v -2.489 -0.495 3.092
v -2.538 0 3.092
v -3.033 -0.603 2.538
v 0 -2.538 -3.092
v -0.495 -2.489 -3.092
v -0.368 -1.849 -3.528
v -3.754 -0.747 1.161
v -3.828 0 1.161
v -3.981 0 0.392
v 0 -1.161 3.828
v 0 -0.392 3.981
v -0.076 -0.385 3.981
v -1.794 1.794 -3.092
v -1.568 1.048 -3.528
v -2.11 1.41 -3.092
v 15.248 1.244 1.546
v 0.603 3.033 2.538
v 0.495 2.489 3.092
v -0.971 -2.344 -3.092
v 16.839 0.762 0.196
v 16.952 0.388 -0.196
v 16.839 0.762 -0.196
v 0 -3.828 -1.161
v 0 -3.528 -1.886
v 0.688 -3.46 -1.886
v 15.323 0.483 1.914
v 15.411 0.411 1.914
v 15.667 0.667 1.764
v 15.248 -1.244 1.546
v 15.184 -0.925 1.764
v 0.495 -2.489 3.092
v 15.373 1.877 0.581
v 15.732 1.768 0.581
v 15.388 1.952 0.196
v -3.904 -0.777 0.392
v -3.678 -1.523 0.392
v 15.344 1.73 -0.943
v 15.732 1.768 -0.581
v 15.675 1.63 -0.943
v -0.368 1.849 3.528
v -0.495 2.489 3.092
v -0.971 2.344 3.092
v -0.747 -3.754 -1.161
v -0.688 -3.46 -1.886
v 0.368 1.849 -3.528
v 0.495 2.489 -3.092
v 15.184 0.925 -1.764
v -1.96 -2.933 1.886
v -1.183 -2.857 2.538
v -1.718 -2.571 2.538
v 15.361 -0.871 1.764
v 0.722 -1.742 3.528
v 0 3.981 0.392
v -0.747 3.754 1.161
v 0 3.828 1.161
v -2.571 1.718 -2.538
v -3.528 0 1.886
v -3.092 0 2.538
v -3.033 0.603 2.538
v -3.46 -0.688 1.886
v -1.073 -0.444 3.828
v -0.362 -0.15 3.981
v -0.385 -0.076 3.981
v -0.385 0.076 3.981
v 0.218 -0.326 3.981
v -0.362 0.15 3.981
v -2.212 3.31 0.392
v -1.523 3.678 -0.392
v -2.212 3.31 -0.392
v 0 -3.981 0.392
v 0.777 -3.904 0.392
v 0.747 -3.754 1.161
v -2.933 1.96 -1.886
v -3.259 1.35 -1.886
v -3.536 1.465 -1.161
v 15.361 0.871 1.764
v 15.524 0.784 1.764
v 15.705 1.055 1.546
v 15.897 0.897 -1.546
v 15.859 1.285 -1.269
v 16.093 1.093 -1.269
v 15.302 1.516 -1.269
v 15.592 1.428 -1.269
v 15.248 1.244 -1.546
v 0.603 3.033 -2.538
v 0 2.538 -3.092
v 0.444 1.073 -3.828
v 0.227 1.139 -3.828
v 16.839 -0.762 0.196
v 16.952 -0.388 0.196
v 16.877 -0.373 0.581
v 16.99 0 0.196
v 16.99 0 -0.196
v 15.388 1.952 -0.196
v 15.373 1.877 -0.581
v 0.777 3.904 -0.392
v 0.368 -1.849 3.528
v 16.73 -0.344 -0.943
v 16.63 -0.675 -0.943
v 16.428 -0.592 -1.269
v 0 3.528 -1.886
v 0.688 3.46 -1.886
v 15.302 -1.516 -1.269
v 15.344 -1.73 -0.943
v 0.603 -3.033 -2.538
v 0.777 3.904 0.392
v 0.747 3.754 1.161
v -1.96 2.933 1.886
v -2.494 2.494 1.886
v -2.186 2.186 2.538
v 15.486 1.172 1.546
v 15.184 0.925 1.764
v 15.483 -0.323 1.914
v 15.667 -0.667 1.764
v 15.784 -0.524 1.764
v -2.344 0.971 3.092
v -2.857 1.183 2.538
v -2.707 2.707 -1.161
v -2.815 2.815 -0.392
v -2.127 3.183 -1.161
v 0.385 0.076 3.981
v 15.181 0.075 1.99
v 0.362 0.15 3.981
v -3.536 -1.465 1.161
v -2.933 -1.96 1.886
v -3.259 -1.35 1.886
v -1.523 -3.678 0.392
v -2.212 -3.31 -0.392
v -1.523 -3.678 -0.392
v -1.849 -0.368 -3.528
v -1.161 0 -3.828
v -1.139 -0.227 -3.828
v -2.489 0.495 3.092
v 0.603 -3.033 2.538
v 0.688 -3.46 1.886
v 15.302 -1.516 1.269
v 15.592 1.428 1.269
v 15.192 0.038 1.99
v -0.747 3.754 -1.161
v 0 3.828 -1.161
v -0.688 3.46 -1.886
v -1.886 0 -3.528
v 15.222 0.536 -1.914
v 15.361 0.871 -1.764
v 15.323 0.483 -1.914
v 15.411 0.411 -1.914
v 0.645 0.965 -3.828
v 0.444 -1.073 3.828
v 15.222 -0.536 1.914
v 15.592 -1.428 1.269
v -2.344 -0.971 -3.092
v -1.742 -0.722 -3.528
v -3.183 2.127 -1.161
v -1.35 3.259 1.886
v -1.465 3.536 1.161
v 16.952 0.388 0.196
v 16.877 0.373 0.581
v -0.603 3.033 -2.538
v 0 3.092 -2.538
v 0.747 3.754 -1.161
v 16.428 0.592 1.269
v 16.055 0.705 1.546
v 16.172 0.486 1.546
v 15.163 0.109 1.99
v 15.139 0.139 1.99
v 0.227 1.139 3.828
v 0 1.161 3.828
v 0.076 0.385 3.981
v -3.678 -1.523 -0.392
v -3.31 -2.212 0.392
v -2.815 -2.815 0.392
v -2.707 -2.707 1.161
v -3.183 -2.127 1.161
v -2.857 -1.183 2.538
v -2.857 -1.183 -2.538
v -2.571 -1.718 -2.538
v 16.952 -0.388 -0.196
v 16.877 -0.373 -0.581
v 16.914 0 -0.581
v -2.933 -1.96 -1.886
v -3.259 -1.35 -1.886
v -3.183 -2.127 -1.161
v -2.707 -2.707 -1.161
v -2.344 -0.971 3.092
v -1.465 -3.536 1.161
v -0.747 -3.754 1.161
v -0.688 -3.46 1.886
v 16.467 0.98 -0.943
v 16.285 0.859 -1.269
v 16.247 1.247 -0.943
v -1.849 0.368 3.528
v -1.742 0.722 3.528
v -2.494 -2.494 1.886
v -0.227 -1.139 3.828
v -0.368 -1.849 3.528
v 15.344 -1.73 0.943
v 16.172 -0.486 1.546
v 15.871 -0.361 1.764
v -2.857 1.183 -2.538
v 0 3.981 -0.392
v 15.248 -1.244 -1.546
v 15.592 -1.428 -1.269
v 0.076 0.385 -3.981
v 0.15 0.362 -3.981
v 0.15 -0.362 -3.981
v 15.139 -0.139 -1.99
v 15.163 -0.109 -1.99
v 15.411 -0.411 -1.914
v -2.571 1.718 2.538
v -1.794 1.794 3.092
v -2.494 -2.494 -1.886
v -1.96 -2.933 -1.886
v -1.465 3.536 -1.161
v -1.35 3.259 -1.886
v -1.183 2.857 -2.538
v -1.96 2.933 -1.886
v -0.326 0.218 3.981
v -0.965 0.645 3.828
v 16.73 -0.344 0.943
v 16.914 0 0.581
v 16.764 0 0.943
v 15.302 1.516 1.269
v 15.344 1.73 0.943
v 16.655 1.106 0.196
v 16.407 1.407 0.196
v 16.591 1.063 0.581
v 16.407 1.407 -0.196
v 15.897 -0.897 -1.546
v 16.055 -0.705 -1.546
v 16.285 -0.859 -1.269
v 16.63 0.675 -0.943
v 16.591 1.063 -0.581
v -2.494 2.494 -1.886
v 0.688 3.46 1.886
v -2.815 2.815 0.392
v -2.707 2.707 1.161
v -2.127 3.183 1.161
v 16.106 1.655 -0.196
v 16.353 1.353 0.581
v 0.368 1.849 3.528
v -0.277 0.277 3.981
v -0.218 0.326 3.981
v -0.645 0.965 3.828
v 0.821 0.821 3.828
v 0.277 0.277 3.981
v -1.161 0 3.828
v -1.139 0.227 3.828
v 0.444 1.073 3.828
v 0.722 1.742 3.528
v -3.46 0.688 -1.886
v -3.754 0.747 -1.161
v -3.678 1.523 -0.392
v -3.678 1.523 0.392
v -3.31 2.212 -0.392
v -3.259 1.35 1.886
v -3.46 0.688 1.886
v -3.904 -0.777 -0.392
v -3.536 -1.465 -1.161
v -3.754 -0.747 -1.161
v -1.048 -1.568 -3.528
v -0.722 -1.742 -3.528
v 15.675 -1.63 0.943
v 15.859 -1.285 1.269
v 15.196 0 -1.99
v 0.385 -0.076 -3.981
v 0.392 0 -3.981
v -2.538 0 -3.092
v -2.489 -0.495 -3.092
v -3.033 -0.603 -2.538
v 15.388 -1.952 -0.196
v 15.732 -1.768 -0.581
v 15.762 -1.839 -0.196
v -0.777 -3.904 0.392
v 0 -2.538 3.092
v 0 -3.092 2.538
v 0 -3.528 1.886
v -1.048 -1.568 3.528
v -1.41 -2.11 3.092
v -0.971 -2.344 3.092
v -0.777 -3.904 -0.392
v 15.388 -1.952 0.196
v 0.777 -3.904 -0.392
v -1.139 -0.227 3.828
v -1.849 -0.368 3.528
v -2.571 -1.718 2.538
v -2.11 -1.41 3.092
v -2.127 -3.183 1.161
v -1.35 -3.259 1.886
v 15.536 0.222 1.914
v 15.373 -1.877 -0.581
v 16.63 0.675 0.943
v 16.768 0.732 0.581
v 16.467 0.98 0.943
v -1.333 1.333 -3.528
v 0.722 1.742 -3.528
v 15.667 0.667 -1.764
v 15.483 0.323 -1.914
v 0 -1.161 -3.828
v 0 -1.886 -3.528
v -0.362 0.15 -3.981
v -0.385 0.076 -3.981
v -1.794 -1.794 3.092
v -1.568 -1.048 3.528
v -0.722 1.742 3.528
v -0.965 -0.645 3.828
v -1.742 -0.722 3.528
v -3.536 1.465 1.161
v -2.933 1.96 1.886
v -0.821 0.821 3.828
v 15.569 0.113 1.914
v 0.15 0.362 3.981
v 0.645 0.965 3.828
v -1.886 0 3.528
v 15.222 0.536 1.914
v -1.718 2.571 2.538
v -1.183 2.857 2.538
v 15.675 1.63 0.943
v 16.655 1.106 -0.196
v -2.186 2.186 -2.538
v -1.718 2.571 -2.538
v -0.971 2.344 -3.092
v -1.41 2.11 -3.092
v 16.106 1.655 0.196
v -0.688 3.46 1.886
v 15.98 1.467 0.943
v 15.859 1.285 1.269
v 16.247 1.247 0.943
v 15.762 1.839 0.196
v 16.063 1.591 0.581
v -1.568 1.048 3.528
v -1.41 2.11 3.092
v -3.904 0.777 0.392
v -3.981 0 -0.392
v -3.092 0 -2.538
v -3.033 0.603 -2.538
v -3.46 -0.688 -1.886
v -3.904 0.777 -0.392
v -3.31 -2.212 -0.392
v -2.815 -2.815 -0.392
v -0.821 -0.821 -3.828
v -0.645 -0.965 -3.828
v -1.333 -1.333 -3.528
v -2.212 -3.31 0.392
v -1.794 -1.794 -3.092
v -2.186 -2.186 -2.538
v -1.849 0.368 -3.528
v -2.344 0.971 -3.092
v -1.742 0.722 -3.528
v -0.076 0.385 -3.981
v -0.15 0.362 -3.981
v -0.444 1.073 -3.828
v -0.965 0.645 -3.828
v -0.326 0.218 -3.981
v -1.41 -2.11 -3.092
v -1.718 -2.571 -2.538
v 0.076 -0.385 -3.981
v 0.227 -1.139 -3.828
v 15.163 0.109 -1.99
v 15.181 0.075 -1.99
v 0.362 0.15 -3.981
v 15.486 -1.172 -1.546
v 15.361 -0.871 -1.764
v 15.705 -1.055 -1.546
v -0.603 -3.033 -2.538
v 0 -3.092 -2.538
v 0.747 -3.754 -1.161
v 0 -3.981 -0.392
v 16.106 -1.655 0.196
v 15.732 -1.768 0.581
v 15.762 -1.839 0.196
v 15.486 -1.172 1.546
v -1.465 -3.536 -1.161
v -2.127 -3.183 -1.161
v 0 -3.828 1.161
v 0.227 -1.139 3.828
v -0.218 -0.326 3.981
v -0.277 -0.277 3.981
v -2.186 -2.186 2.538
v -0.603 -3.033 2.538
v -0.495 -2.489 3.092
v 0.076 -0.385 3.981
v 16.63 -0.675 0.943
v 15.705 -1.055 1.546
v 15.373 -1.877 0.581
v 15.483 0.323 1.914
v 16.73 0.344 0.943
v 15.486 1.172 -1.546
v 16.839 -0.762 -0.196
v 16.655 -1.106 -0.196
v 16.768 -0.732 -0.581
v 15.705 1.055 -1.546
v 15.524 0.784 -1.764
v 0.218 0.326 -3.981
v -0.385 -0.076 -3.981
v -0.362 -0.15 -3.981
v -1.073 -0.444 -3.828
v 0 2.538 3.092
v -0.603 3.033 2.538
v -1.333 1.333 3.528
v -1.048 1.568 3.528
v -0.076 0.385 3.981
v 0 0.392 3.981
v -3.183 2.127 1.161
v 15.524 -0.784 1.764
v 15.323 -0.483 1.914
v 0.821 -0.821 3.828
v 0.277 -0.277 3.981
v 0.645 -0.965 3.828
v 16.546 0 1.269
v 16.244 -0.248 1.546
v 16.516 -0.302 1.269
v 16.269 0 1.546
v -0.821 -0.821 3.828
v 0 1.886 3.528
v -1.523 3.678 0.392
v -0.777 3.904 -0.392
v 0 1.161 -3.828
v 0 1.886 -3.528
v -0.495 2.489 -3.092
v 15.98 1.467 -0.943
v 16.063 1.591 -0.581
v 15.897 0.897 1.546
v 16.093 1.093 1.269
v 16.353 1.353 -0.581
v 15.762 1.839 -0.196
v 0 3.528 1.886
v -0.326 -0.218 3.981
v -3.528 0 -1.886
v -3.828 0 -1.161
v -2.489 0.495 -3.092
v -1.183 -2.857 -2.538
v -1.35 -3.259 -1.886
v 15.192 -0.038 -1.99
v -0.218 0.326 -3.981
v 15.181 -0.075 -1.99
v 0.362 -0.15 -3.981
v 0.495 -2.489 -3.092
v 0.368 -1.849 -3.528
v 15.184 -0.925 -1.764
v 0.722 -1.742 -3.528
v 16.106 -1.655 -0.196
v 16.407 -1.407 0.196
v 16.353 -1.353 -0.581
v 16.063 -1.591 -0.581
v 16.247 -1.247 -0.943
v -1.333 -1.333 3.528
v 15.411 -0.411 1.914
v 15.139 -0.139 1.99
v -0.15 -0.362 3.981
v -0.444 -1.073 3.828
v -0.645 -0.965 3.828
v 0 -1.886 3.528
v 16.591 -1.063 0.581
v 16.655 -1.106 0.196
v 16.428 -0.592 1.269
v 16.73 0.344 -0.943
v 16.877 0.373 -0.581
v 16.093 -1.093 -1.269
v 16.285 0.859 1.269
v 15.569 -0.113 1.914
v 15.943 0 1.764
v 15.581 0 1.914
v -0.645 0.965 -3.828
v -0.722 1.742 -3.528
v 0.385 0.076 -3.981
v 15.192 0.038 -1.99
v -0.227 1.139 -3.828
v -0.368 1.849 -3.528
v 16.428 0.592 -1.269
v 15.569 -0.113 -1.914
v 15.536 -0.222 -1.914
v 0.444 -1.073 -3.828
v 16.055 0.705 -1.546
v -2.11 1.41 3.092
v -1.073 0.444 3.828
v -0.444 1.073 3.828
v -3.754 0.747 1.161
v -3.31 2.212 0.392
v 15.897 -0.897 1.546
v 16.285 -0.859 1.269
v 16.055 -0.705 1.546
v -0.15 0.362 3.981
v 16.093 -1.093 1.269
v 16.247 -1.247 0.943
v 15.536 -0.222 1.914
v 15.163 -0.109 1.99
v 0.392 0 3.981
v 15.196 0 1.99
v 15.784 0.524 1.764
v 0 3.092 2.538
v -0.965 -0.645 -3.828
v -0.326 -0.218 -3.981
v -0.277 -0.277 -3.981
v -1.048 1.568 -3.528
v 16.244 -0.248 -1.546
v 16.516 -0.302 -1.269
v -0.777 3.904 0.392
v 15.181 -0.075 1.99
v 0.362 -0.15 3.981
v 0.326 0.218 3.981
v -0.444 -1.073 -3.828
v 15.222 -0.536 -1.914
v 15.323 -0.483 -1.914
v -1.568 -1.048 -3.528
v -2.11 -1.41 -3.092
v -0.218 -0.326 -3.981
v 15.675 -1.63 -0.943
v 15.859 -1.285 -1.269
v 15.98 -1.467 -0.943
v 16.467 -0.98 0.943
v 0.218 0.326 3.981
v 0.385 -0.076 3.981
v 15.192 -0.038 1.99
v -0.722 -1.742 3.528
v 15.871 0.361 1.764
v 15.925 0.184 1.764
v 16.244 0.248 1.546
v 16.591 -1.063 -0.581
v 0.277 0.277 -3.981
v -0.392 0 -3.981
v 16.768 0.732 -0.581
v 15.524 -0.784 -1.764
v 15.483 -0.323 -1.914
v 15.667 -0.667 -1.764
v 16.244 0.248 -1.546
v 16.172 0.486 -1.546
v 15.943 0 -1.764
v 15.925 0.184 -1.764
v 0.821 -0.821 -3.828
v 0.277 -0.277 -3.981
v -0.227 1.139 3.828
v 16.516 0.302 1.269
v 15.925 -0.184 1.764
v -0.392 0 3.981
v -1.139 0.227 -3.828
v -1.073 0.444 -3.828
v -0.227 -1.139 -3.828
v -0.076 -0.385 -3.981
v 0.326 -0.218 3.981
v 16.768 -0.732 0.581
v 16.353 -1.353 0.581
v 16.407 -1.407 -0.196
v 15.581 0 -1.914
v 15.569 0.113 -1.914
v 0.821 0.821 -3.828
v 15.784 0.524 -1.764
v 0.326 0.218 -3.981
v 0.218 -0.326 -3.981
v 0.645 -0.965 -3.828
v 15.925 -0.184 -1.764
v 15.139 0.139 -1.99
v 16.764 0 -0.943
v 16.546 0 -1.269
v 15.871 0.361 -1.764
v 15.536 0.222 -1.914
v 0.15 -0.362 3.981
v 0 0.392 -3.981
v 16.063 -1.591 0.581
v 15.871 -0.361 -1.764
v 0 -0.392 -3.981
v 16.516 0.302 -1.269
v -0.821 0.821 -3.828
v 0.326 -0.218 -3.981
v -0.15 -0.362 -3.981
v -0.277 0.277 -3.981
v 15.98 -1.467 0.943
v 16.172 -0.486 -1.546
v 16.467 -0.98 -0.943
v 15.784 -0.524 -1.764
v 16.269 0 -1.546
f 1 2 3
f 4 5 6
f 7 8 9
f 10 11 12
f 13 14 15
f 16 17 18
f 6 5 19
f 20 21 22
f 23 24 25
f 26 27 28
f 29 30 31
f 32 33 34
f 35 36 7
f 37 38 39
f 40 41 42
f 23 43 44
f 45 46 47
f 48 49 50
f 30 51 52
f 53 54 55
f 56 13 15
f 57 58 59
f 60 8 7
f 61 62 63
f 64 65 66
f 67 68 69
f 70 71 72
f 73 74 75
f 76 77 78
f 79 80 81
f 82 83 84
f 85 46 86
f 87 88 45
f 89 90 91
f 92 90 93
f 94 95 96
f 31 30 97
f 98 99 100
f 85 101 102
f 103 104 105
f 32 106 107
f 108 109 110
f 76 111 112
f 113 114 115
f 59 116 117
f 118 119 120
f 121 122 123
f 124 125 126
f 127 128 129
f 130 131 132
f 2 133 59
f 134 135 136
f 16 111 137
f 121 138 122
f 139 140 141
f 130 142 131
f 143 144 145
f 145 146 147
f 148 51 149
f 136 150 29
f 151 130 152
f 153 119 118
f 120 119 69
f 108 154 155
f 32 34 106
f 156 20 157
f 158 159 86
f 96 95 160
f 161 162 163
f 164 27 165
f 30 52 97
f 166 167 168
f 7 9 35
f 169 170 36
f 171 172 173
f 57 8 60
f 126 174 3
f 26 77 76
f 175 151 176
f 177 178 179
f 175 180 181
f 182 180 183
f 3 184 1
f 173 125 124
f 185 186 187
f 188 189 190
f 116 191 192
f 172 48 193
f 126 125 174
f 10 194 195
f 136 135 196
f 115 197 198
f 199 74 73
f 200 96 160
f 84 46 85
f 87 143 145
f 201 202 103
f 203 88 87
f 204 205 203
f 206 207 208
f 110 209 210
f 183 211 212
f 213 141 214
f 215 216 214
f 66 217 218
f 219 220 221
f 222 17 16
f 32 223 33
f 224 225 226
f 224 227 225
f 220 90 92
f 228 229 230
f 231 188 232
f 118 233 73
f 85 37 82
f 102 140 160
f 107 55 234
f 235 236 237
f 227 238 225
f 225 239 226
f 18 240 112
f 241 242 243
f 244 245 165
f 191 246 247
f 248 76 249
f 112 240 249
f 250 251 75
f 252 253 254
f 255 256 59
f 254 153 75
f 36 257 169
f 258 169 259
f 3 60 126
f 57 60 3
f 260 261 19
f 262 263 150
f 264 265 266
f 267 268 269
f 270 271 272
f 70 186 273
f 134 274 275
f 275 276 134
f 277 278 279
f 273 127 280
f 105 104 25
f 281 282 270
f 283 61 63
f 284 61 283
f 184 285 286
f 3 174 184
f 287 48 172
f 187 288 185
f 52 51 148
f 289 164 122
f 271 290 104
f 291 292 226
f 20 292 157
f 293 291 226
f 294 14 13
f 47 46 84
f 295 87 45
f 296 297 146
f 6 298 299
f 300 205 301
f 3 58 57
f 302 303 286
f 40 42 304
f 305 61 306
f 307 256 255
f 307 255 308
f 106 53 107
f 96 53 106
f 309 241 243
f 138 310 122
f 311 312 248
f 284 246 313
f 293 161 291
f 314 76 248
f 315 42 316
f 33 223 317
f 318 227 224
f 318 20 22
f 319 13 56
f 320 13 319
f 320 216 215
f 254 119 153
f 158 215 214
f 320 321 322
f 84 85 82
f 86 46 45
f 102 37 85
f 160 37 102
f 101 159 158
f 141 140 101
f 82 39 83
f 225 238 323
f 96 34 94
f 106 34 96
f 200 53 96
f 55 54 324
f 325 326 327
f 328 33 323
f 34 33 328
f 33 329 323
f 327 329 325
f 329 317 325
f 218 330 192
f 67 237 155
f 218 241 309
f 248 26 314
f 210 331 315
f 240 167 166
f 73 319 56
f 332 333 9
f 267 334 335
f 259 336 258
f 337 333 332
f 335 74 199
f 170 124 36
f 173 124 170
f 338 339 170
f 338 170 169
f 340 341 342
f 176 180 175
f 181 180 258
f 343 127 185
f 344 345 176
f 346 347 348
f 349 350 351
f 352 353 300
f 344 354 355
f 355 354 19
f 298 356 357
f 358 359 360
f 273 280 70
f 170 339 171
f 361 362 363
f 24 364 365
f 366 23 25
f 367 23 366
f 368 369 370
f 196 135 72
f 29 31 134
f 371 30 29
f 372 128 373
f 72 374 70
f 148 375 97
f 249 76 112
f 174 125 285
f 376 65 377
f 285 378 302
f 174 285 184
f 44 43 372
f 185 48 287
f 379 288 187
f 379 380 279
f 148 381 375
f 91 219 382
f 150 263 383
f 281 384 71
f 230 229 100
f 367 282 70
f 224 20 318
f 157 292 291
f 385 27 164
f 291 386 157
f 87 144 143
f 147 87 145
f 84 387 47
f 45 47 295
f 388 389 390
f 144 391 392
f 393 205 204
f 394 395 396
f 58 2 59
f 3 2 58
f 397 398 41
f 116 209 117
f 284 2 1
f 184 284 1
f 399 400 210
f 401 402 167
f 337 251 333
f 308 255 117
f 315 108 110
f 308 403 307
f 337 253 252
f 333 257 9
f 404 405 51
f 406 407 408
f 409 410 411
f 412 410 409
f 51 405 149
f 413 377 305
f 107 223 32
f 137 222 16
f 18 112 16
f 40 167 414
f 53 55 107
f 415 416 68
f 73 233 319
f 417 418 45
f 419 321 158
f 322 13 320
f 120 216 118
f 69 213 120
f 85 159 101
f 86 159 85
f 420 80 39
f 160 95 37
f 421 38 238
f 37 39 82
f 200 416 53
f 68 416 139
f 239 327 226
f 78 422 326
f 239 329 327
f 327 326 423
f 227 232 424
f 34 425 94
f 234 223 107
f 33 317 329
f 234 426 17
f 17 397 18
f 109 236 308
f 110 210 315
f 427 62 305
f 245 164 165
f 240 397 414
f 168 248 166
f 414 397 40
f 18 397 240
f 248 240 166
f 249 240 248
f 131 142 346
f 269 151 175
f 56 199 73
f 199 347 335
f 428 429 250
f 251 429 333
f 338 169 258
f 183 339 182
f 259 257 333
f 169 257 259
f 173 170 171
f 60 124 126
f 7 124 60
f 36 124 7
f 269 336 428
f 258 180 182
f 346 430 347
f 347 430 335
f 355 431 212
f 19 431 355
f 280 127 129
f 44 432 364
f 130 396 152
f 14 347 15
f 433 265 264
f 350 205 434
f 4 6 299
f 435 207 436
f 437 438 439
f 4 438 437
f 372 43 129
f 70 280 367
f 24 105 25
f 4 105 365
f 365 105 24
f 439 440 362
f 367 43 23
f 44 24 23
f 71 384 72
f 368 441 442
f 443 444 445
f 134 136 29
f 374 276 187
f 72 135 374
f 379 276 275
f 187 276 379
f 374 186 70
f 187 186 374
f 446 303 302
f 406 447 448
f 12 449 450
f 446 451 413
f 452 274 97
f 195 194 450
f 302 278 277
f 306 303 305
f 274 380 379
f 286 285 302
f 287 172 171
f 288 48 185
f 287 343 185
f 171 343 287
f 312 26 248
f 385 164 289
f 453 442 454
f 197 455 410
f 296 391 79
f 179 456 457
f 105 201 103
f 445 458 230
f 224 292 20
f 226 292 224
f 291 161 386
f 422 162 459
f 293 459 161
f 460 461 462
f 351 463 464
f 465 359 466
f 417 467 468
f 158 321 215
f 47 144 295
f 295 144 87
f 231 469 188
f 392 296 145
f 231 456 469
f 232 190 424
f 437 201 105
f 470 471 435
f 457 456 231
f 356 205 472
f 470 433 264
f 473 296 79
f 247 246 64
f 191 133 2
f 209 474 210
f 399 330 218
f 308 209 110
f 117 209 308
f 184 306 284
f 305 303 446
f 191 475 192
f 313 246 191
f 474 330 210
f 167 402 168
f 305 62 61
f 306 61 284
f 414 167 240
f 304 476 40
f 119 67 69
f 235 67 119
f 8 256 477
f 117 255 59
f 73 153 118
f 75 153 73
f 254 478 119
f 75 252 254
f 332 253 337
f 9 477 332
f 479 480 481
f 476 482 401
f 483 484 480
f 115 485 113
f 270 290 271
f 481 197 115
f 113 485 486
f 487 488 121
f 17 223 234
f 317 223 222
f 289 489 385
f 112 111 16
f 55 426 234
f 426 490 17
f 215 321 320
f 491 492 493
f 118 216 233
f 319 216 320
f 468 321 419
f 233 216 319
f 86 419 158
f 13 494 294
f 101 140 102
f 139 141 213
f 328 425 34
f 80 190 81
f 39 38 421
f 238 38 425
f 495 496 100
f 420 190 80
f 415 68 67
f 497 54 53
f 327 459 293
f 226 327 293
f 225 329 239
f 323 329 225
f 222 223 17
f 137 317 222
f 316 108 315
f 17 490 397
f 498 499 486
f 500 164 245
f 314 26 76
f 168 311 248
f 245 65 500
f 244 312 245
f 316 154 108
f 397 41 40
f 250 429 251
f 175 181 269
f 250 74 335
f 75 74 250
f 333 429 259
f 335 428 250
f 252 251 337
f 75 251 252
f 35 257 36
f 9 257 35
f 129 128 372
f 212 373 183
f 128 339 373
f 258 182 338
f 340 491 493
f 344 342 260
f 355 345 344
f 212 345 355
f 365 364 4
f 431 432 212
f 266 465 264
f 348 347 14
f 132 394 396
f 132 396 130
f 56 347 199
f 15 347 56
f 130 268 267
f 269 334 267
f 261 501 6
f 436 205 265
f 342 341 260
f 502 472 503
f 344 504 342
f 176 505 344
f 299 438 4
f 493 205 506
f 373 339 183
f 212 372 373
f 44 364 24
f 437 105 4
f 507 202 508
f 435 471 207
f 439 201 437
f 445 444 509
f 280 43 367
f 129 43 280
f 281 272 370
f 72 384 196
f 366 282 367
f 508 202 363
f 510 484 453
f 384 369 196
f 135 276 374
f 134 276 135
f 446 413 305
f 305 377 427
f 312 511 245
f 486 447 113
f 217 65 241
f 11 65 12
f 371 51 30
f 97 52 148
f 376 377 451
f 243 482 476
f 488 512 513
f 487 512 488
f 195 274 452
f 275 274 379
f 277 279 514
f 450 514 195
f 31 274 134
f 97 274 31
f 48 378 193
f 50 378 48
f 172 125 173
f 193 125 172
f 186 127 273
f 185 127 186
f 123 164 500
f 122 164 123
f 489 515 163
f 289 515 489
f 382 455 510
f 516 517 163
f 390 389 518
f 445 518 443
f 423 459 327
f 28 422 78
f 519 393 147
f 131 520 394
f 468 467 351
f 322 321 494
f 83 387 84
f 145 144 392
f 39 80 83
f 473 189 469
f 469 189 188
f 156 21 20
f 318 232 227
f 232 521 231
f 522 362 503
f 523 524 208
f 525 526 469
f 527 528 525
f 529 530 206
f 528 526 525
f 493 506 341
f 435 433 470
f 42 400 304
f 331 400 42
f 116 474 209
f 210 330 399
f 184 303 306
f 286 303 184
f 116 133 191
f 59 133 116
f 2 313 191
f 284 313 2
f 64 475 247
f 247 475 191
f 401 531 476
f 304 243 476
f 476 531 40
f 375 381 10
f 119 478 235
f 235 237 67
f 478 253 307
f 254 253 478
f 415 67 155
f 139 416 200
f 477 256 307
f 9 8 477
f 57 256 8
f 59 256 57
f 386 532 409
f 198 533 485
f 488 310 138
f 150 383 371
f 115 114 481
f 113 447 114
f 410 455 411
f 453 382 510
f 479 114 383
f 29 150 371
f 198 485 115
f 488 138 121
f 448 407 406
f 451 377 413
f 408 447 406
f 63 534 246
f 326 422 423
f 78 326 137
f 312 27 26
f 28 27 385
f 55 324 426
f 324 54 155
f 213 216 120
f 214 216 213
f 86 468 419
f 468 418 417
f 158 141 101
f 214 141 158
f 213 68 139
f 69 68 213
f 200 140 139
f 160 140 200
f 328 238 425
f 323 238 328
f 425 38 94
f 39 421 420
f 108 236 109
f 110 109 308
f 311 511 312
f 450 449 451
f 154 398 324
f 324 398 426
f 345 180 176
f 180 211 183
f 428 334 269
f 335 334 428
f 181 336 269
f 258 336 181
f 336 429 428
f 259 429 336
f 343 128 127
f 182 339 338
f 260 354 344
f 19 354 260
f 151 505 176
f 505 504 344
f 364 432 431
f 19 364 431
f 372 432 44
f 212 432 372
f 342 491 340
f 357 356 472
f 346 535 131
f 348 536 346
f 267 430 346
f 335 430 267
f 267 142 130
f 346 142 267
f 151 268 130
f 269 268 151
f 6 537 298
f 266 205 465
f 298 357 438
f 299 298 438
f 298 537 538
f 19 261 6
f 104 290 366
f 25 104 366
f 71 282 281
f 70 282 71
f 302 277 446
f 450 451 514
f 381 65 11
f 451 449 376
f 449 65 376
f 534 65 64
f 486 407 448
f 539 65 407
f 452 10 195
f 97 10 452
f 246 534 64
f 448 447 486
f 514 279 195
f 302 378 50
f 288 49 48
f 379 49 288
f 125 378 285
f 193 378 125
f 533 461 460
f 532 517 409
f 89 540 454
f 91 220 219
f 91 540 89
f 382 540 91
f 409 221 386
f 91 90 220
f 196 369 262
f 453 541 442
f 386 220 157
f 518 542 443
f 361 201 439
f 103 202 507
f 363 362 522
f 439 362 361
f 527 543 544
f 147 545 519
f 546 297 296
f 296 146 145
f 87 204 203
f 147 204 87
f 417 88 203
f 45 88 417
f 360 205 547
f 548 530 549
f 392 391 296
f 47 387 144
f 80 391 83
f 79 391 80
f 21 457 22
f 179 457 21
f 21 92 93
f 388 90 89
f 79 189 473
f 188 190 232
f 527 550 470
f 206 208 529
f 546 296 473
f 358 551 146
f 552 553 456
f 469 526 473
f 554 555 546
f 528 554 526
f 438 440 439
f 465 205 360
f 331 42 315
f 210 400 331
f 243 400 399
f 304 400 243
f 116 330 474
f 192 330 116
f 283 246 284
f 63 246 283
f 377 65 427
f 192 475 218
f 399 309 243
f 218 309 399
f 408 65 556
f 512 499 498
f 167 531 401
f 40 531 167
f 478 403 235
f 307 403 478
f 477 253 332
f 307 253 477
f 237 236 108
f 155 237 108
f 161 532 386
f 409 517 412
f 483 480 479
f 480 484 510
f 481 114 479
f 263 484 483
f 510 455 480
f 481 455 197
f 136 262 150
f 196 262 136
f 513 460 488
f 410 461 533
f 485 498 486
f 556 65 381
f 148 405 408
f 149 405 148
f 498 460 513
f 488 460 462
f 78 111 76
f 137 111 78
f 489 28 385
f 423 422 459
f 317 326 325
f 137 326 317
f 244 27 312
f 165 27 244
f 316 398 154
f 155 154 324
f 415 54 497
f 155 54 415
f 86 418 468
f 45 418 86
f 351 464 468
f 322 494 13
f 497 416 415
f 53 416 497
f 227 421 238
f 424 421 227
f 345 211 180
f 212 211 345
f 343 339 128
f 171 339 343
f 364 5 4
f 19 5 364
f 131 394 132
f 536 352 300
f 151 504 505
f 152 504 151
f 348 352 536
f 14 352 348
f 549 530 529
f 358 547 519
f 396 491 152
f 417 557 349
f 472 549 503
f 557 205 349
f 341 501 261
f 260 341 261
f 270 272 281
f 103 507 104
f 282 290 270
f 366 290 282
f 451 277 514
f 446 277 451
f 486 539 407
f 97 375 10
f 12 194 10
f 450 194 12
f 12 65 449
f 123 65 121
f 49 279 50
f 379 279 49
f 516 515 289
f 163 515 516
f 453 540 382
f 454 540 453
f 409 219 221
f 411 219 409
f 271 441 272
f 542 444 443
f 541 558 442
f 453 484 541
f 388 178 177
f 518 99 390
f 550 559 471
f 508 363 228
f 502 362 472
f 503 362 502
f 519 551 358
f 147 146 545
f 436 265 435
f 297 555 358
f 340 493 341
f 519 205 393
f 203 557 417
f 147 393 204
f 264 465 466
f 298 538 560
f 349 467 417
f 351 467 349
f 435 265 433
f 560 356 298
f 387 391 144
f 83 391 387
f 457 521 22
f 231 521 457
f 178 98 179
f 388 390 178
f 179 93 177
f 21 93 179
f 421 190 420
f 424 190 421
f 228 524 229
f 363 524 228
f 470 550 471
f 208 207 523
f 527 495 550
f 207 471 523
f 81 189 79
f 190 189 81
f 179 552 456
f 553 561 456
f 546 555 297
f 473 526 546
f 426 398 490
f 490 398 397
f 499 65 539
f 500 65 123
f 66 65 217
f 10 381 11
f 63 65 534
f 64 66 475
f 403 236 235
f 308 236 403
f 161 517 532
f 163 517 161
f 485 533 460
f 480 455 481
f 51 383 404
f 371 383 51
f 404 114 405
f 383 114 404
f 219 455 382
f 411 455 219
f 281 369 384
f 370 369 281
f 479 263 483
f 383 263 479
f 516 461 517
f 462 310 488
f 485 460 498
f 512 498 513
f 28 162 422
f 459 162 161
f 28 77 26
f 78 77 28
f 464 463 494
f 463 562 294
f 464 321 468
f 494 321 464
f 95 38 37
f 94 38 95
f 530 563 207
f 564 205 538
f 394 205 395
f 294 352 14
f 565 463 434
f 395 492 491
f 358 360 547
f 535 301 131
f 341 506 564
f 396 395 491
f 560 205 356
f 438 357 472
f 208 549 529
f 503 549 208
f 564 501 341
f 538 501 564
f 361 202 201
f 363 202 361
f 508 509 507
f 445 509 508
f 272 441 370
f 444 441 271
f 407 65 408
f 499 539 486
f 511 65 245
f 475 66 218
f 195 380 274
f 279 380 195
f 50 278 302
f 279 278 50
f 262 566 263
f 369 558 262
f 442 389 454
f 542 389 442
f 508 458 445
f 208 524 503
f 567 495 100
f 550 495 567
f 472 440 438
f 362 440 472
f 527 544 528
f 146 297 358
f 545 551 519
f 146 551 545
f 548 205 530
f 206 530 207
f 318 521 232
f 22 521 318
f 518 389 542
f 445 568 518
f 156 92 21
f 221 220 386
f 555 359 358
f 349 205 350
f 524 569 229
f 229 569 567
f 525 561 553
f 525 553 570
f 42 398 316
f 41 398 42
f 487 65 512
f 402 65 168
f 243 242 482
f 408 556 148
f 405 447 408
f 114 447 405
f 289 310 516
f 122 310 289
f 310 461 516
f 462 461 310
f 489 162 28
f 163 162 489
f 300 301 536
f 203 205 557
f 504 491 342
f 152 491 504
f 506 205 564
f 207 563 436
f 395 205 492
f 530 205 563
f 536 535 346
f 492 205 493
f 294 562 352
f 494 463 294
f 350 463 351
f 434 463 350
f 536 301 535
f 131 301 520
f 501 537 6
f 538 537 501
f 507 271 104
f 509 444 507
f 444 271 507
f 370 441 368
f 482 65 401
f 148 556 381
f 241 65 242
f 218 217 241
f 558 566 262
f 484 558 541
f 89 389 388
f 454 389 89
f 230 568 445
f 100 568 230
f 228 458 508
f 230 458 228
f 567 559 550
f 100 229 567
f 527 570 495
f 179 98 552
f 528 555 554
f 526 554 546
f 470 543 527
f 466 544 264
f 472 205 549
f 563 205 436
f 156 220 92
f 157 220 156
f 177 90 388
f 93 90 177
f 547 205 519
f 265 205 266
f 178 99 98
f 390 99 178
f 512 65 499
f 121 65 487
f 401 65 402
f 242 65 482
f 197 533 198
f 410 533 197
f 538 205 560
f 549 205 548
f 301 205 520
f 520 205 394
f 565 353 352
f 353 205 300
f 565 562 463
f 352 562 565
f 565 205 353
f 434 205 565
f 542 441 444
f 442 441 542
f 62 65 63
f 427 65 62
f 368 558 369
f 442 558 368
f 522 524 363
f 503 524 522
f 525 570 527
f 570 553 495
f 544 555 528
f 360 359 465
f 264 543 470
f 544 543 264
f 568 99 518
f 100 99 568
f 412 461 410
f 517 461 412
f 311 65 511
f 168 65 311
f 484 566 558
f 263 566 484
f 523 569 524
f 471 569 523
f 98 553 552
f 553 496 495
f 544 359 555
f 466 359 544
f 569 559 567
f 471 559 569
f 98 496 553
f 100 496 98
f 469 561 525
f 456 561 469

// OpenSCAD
// A color, a hull, and a translucent ghost (the ghost is not part of the model)
color("steelblue") hull() { sphere(r = 4, $fn = 32); translate([15, 0, 0]) sphere(r = 2, $fn = 32); }
%translate([0, 0, 6]) cube(3);
